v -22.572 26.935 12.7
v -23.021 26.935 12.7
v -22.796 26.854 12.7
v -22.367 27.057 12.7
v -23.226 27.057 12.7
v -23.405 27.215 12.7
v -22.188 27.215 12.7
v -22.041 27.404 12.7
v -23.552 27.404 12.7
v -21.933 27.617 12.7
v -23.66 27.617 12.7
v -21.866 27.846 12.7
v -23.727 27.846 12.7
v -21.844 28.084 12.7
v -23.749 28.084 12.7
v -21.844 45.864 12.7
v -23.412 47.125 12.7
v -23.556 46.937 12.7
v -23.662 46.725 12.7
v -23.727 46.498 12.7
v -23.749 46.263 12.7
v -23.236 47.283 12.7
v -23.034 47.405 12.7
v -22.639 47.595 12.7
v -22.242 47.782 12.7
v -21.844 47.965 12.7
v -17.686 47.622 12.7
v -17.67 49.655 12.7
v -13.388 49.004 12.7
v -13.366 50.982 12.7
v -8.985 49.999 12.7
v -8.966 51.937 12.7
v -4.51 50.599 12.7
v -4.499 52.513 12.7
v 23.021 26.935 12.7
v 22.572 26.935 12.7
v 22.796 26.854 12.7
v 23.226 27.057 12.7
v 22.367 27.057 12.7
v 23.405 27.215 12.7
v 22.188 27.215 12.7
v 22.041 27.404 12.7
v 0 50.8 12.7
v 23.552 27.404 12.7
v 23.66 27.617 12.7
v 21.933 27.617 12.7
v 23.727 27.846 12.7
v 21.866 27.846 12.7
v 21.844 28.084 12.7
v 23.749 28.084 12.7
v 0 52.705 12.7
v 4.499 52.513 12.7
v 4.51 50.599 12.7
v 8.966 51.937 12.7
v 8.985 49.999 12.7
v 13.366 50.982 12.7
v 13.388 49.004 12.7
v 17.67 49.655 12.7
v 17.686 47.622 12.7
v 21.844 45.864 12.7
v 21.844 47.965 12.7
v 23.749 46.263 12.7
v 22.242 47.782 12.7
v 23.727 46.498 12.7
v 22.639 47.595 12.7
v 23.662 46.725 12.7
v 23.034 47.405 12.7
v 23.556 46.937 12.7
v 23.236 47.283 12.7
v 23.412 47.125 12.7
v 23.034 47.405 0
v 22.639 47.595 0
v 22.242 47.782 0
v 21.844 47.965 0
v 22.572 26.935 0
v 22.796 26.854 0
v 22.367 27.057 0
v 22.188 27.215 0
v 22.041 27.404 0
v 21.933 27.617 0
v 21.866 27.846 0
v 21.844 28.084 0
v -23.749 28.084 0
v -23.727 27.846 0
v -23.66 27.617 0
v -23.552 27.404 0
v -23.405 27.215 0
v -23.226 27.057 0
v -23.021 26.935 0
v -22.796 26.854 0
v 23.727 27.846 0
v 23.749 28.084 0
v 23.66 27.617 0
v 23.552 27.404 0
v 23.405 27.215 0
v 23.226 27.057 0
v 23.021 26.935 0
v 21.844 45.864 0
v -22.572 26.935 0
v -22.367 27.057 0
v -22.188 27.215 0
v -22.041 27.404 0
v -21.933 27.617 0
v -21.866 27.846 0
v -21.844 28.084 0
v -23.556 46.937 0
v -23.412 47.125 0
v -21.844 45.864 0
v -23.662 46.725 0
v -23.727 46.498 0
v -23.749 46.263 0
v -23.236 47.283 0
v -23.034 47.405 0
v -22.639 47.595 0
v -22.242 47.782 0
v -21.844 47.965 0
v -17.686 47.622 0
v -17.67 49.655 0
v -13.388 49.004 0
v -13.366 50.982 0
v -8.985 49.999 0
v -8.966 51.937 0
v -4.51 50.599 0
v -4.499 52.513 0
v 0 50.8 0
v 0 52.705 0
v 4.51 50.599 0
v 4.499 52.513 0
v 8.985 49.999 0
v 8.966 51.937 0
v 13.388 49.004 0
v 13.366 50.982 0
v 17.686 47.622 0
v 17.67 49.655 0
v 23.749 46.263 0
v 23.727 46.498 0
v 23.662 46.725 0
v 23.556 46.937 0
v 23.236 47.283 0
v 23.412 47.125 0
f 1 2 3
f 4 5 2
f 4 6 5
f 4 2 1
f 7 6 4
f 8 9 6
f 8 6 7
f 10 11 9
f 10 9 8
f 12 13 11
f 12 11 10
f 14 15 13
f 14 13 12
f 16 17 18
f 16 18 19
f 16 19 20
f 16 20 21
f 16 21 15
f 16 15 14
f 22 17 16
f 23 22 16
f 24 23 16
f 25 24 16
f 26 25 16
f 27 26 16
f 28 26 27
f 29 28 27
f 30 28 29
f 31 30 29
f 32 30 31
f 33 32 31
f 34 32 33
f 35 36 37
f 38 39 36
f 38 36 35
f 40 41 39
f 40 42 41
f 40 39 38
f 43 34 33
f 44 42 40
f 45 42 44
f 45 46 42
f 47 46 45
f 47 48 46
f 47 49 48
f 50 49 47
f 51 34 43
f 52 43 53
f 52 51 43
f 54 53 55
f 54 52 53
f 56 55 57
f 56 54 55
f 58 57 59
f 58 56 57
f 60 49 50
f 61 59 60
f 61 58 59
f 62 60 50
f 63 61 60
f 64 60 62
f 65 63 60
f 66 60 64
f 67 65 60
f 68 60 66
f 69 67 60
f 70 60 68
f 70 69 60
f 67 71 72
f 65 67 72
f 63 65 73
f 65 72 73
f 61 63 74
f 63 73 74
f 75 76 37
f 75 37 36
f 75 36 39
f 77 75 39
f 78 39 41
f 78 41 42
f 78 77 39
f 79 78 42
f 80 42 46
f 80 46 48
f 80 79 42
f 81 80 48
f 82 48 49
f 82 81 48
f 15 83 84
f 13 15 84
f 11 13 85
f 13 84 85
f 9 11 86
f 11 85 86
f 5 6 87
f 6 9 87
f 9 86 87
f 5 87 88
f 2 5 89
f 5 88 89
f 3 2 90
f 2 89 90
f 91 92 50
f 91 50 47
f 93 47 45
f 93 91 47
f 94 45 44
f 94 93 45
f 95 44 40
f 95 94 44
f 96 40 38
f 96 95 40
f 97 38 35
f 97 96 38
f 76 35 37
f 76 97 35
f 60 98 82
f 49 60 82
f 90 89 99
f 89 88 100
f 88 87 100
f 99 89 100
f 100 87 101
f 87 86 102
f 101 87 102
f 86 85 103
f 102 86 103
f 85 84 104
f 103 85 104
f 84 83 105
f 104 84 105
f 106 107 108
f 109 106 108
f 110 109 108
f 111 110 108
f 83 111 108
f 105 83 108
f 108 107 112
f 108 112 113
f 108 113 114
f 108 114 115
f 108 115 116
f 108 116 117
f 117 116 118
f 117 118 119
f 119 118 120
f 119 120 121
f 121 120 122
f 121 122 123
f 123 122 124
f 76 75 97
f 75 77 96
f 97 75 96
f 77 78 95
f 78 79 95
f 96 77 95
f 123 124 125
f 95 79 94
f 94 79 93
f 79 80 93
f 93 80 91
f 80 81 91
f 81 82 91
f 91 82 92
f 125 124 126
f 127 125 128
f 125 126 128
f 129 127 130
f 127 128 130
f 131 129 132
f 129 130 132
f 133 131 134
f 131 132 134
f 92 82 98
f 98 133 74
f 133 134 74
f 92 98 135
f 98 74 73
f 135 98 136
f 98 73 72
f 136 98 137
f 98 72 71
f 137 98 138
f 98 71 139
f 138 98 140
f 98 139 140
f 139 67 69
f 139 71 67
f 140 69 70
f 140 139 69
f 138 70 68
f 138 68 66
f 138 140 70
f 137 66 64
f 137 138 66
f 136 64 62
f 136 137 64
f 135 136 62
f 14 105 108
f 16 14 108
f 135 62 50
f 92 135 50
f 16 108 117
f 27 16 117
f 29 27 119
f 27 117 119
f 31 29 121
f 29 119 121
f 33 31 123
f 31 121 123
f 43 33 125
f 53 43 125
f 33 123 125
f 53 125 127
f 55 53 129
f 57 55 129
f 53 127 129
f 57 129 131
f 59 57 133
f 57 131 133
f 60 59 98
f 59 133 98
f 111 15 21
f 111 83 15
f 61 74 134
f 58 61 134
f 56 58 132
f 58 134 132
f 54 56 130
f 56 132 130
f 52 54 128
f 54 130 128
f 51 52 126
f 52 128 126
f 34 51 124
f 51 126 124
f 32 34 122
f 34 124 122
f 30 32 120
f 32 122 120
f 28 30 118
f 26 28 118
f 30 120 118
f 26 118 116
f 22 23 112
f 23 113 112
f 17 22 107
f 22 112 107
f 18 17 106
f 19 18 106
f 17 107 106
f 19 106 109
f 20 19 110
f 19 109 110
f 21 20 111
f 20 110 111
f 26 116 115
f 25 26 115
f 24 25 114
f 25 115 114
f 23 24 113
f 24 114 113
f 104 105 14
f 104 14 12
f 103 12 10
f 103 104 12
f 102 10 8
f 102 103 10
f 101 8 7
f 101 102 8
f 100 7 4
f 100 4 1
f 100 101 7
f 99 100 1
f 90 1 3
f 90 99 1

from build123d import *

# Parameters (mm, degrees)
F1_DEPTH    = 12.7
F3_DEPTH    = 32.1945
F4_T1_DEPTH = 19.05
F5_R        = 1.27


# Not quite as in the source:
# - a fillet or chamfer that OpenCascade refuses, or shapes differently, is made with other operations: its cross-section is extruded or revolved along the edge and cut away or added


with BuildPart() as f1:
    # F0 (on Top) → F1 (new body)
    with BuildSketch(Plane.XY):
        with BuildLine():
            Line((-25.9680064888, 45.8637074821), (-25.9680064888, 43.6612258073))
            ThreePointArc((-25.9680064888, 43.6612258073), (-23.9313543809, 44.8099350312), (-21.844, 45.8637074821))
            Line((-21.844, 45.8637074821), (-21.844, 47.9651612006))
            ThreePointArc((-21.844, 47.9651612006), (-23.929083101, 46.9597275008), (-25.9680064888, 45.8637074821))
        make_face()
        with BuildLine():
            ThreePointArc((-21.844, 45.8637074821), (-23.9313543809, 44.8099350312), (-25.9680064888, 43.6612258073))
            Line((-25.9680064888, 43.6612258073), (-25.9680064888, 26.8137074821))
            Line((-25.9680064888, 26.8137074821), (-21.844, 26.8137074821))
            Line((-21.844, 26.8137074821), (-21.844, 45.8637074821))
        make_face()
        with BuildLine():
            ThreePointArc((21.844, 45.8637074821), (23.9313543809, 44.8099350312), (25.9680064888, 43.6612258073))
            Line((25.9680064888, 43.6612258073), (25.9680064888, 45.8637074821))
            ThreePointArc((25.9680064888, 45.8637074821), (23.929083101, 46.9597275008), (21.844, 47.9651612006))
            Line((21.844, 47.9651612006), (21.844, 45.8637074821))
        make_face()
        with BuildLine():
            Line((25.9680064888, 26.8137074821), (25.9680064888, 43.6612258073))
            ThreePointArc((25.9680064888, 43.6612258073), (23.9313543809, 44.8099350312), (21.844, 45.8637074821))
            Line((21.844, 45.8637074821), (21.844, 26.8137074821))
            Line((21.844, 26.8137074821), (25.9680064888, 26.8137074821))
        make_face()
        with BuildLine():
            ThreePointArc((-21.844, 45.8637074821), (0, 50.8), (21.844, 45.8637074821))
            Line((21.844, 45.8637074821), (21.844, 47.9651612006))
            ThreePointArc((21.844, 47.9651612006), (0, 52.705), (-21.844, 47.9651612006))
            Line((-21.844, 47.9651612006), (-21.844, 45.8637074821))
        make_face()
    extrude(amount=F1_DEPTH)

    # F2 (on face) → F3 (cut, symmetric)
    with BuildSketch(Plane.XY.offset(12.7)):
        with BuildLine():
            Line((-23.749, 47.0510576289), (-23.749, 52.2757731378))
            Line((-23.749, 52.2757731378), (-31.0743017153, 52.1406124749))
            Line((-31.0743017153, 52.1406124749), (-30.5507772572, 23.7671602517))
            Line((-30.5507772572, 23.7671602517), (-23.749, 23.7671602517))
            Line((-23.749, 23.7671602517), (-23.749, 26.8137074821))
            Line((-23.749, 26.8137074821), (-25.9680064888, 26.8137074821))
            Line((-25.9680064888, 26.8137074821), (-25.9680064888, 45.8637074821))
            ThreePointArc((-25.9680064888, 45.8637074821), (-24.8655913592, 46.4706293411), (-23.749, 47.0510576289))
        make_face()
        with BuildLine():
            Line((23.749, 52.2757731378), (23.749, 47.0510576289))
            ThreePointArc((23.749, 47.0510576289), (24.8655913592, 46.4706293411), (25.9680064888, 45.8637074821))
            Line((25.9680064888, 45.8637074821), (25.9680064888, 26.8137074821))
            Line((25.9680064888, 26.8137074821), (23.749, 26.8137074821))
            Line((23.749, 26.8137074821), (23.749, 23.7671602517))
            Line((23.749, 23.7671602517), (30.5507772572, 23.7671602517))
            Line((30.5507772572, 23.7671602517), (31.0743017153, 52.1406124749))
            Line((31.0743017153, 52.1406124749), (23.749, 52.2757731378))
        make_face()
        with BuildLine():
            Line((-23.749, 26.8137074821), (-23.749, 47.0510576289))
            ThreePointArc((-23.749, 47.0510576289), (-24.8655913592, 46.4706293411), (-25.9680064888, 45.8637074821))
            Line((-25.9680064888, 45.8637074821), (-25.9680064888, 26.8137074821))
            Line((-25.9680064888, 26.8137074821), (-23.749, 26.8137074821))
        make_face()
        with BuildLine():
            ThreePointArc((25.9680064888, 45.8637074821), (24.8655913592, 46.4706293411), (23.749, 47.0510576289))
            Line((23.749, 47.0510576289), (23.749, 26.8137074821))
            Line((23.749, 26.8137074821), (25.9680064888, 26.8137074821))
            Line((25.9680064888, 26.8137074821), (25.9680064888, 45.8637074821))
        make_face()
    extrude(amount=F3_DEPTH, both=True, mode=Mode.SUBTRACT)

    # F4: fillet of radius 1.27 on 4 edges, made by hand

    # F4_s2 → F4_t1 (cut)
    with BuildSketch(Plane.XY.offset(-3.175)):
        with BuildLine():
            ThreePointArc((-21.844, 28.0837074821), (-22.2159743879, 27.18568187), (-23.114, 26.8137074821))
            Line((-23.114, 26.8137074821), (-21.844, 26.8137074821))
            Line((-21.844, 26.8137074821), (-21.844, 28.0837074821))
        make_face()
        with BuildLine():
            ThreePointArc((-23.749, 28.0837074821), (-23.3770256121, 27.18568187), (-22.479, 26.8137074821))
            Line((-22.479, 26.8137074821), (-23.749, 26.8137074821))
            Line((-23.749, 26.8137074821), (-23.749, 28.0837074821))
        make_face()
        with BuildLine():
            ThreePointArc((23.114, 26.8137074821), (22.2159743879, 27.18568187), (21.844, 28.0837074821))
            Line((21.844, 28.0837074821), (21.844, 26.8137074821))
            Line((21.844, 26.8137074821), (23.114, 26.8137074821))
        make_face()
        with BuildLine():
            ThreePointArc((23.749, 28.0837074821), (23.3770256121, 27.18568187), (22.479, 26.8137074821))
            Line((22.479, 26.8137074821), (23.749, 26.8137074821))
            Line((23.749, 26.8137074821), (23.749, 28.0837074821))
        make_face()
    extrude(amount=F4_T1_DEPTH, mode=Mode.SUBTRACT)

    # F5
    f5_edges = [f1.edges().sort_by_distance(p)[0] for p in [
        (23.749, 47.051058, 6.35),
        (-23.749, 47.051058, 6.35),
    ]]
    fillet(f5_edges, radius=F5_R)


solid = f1.part
